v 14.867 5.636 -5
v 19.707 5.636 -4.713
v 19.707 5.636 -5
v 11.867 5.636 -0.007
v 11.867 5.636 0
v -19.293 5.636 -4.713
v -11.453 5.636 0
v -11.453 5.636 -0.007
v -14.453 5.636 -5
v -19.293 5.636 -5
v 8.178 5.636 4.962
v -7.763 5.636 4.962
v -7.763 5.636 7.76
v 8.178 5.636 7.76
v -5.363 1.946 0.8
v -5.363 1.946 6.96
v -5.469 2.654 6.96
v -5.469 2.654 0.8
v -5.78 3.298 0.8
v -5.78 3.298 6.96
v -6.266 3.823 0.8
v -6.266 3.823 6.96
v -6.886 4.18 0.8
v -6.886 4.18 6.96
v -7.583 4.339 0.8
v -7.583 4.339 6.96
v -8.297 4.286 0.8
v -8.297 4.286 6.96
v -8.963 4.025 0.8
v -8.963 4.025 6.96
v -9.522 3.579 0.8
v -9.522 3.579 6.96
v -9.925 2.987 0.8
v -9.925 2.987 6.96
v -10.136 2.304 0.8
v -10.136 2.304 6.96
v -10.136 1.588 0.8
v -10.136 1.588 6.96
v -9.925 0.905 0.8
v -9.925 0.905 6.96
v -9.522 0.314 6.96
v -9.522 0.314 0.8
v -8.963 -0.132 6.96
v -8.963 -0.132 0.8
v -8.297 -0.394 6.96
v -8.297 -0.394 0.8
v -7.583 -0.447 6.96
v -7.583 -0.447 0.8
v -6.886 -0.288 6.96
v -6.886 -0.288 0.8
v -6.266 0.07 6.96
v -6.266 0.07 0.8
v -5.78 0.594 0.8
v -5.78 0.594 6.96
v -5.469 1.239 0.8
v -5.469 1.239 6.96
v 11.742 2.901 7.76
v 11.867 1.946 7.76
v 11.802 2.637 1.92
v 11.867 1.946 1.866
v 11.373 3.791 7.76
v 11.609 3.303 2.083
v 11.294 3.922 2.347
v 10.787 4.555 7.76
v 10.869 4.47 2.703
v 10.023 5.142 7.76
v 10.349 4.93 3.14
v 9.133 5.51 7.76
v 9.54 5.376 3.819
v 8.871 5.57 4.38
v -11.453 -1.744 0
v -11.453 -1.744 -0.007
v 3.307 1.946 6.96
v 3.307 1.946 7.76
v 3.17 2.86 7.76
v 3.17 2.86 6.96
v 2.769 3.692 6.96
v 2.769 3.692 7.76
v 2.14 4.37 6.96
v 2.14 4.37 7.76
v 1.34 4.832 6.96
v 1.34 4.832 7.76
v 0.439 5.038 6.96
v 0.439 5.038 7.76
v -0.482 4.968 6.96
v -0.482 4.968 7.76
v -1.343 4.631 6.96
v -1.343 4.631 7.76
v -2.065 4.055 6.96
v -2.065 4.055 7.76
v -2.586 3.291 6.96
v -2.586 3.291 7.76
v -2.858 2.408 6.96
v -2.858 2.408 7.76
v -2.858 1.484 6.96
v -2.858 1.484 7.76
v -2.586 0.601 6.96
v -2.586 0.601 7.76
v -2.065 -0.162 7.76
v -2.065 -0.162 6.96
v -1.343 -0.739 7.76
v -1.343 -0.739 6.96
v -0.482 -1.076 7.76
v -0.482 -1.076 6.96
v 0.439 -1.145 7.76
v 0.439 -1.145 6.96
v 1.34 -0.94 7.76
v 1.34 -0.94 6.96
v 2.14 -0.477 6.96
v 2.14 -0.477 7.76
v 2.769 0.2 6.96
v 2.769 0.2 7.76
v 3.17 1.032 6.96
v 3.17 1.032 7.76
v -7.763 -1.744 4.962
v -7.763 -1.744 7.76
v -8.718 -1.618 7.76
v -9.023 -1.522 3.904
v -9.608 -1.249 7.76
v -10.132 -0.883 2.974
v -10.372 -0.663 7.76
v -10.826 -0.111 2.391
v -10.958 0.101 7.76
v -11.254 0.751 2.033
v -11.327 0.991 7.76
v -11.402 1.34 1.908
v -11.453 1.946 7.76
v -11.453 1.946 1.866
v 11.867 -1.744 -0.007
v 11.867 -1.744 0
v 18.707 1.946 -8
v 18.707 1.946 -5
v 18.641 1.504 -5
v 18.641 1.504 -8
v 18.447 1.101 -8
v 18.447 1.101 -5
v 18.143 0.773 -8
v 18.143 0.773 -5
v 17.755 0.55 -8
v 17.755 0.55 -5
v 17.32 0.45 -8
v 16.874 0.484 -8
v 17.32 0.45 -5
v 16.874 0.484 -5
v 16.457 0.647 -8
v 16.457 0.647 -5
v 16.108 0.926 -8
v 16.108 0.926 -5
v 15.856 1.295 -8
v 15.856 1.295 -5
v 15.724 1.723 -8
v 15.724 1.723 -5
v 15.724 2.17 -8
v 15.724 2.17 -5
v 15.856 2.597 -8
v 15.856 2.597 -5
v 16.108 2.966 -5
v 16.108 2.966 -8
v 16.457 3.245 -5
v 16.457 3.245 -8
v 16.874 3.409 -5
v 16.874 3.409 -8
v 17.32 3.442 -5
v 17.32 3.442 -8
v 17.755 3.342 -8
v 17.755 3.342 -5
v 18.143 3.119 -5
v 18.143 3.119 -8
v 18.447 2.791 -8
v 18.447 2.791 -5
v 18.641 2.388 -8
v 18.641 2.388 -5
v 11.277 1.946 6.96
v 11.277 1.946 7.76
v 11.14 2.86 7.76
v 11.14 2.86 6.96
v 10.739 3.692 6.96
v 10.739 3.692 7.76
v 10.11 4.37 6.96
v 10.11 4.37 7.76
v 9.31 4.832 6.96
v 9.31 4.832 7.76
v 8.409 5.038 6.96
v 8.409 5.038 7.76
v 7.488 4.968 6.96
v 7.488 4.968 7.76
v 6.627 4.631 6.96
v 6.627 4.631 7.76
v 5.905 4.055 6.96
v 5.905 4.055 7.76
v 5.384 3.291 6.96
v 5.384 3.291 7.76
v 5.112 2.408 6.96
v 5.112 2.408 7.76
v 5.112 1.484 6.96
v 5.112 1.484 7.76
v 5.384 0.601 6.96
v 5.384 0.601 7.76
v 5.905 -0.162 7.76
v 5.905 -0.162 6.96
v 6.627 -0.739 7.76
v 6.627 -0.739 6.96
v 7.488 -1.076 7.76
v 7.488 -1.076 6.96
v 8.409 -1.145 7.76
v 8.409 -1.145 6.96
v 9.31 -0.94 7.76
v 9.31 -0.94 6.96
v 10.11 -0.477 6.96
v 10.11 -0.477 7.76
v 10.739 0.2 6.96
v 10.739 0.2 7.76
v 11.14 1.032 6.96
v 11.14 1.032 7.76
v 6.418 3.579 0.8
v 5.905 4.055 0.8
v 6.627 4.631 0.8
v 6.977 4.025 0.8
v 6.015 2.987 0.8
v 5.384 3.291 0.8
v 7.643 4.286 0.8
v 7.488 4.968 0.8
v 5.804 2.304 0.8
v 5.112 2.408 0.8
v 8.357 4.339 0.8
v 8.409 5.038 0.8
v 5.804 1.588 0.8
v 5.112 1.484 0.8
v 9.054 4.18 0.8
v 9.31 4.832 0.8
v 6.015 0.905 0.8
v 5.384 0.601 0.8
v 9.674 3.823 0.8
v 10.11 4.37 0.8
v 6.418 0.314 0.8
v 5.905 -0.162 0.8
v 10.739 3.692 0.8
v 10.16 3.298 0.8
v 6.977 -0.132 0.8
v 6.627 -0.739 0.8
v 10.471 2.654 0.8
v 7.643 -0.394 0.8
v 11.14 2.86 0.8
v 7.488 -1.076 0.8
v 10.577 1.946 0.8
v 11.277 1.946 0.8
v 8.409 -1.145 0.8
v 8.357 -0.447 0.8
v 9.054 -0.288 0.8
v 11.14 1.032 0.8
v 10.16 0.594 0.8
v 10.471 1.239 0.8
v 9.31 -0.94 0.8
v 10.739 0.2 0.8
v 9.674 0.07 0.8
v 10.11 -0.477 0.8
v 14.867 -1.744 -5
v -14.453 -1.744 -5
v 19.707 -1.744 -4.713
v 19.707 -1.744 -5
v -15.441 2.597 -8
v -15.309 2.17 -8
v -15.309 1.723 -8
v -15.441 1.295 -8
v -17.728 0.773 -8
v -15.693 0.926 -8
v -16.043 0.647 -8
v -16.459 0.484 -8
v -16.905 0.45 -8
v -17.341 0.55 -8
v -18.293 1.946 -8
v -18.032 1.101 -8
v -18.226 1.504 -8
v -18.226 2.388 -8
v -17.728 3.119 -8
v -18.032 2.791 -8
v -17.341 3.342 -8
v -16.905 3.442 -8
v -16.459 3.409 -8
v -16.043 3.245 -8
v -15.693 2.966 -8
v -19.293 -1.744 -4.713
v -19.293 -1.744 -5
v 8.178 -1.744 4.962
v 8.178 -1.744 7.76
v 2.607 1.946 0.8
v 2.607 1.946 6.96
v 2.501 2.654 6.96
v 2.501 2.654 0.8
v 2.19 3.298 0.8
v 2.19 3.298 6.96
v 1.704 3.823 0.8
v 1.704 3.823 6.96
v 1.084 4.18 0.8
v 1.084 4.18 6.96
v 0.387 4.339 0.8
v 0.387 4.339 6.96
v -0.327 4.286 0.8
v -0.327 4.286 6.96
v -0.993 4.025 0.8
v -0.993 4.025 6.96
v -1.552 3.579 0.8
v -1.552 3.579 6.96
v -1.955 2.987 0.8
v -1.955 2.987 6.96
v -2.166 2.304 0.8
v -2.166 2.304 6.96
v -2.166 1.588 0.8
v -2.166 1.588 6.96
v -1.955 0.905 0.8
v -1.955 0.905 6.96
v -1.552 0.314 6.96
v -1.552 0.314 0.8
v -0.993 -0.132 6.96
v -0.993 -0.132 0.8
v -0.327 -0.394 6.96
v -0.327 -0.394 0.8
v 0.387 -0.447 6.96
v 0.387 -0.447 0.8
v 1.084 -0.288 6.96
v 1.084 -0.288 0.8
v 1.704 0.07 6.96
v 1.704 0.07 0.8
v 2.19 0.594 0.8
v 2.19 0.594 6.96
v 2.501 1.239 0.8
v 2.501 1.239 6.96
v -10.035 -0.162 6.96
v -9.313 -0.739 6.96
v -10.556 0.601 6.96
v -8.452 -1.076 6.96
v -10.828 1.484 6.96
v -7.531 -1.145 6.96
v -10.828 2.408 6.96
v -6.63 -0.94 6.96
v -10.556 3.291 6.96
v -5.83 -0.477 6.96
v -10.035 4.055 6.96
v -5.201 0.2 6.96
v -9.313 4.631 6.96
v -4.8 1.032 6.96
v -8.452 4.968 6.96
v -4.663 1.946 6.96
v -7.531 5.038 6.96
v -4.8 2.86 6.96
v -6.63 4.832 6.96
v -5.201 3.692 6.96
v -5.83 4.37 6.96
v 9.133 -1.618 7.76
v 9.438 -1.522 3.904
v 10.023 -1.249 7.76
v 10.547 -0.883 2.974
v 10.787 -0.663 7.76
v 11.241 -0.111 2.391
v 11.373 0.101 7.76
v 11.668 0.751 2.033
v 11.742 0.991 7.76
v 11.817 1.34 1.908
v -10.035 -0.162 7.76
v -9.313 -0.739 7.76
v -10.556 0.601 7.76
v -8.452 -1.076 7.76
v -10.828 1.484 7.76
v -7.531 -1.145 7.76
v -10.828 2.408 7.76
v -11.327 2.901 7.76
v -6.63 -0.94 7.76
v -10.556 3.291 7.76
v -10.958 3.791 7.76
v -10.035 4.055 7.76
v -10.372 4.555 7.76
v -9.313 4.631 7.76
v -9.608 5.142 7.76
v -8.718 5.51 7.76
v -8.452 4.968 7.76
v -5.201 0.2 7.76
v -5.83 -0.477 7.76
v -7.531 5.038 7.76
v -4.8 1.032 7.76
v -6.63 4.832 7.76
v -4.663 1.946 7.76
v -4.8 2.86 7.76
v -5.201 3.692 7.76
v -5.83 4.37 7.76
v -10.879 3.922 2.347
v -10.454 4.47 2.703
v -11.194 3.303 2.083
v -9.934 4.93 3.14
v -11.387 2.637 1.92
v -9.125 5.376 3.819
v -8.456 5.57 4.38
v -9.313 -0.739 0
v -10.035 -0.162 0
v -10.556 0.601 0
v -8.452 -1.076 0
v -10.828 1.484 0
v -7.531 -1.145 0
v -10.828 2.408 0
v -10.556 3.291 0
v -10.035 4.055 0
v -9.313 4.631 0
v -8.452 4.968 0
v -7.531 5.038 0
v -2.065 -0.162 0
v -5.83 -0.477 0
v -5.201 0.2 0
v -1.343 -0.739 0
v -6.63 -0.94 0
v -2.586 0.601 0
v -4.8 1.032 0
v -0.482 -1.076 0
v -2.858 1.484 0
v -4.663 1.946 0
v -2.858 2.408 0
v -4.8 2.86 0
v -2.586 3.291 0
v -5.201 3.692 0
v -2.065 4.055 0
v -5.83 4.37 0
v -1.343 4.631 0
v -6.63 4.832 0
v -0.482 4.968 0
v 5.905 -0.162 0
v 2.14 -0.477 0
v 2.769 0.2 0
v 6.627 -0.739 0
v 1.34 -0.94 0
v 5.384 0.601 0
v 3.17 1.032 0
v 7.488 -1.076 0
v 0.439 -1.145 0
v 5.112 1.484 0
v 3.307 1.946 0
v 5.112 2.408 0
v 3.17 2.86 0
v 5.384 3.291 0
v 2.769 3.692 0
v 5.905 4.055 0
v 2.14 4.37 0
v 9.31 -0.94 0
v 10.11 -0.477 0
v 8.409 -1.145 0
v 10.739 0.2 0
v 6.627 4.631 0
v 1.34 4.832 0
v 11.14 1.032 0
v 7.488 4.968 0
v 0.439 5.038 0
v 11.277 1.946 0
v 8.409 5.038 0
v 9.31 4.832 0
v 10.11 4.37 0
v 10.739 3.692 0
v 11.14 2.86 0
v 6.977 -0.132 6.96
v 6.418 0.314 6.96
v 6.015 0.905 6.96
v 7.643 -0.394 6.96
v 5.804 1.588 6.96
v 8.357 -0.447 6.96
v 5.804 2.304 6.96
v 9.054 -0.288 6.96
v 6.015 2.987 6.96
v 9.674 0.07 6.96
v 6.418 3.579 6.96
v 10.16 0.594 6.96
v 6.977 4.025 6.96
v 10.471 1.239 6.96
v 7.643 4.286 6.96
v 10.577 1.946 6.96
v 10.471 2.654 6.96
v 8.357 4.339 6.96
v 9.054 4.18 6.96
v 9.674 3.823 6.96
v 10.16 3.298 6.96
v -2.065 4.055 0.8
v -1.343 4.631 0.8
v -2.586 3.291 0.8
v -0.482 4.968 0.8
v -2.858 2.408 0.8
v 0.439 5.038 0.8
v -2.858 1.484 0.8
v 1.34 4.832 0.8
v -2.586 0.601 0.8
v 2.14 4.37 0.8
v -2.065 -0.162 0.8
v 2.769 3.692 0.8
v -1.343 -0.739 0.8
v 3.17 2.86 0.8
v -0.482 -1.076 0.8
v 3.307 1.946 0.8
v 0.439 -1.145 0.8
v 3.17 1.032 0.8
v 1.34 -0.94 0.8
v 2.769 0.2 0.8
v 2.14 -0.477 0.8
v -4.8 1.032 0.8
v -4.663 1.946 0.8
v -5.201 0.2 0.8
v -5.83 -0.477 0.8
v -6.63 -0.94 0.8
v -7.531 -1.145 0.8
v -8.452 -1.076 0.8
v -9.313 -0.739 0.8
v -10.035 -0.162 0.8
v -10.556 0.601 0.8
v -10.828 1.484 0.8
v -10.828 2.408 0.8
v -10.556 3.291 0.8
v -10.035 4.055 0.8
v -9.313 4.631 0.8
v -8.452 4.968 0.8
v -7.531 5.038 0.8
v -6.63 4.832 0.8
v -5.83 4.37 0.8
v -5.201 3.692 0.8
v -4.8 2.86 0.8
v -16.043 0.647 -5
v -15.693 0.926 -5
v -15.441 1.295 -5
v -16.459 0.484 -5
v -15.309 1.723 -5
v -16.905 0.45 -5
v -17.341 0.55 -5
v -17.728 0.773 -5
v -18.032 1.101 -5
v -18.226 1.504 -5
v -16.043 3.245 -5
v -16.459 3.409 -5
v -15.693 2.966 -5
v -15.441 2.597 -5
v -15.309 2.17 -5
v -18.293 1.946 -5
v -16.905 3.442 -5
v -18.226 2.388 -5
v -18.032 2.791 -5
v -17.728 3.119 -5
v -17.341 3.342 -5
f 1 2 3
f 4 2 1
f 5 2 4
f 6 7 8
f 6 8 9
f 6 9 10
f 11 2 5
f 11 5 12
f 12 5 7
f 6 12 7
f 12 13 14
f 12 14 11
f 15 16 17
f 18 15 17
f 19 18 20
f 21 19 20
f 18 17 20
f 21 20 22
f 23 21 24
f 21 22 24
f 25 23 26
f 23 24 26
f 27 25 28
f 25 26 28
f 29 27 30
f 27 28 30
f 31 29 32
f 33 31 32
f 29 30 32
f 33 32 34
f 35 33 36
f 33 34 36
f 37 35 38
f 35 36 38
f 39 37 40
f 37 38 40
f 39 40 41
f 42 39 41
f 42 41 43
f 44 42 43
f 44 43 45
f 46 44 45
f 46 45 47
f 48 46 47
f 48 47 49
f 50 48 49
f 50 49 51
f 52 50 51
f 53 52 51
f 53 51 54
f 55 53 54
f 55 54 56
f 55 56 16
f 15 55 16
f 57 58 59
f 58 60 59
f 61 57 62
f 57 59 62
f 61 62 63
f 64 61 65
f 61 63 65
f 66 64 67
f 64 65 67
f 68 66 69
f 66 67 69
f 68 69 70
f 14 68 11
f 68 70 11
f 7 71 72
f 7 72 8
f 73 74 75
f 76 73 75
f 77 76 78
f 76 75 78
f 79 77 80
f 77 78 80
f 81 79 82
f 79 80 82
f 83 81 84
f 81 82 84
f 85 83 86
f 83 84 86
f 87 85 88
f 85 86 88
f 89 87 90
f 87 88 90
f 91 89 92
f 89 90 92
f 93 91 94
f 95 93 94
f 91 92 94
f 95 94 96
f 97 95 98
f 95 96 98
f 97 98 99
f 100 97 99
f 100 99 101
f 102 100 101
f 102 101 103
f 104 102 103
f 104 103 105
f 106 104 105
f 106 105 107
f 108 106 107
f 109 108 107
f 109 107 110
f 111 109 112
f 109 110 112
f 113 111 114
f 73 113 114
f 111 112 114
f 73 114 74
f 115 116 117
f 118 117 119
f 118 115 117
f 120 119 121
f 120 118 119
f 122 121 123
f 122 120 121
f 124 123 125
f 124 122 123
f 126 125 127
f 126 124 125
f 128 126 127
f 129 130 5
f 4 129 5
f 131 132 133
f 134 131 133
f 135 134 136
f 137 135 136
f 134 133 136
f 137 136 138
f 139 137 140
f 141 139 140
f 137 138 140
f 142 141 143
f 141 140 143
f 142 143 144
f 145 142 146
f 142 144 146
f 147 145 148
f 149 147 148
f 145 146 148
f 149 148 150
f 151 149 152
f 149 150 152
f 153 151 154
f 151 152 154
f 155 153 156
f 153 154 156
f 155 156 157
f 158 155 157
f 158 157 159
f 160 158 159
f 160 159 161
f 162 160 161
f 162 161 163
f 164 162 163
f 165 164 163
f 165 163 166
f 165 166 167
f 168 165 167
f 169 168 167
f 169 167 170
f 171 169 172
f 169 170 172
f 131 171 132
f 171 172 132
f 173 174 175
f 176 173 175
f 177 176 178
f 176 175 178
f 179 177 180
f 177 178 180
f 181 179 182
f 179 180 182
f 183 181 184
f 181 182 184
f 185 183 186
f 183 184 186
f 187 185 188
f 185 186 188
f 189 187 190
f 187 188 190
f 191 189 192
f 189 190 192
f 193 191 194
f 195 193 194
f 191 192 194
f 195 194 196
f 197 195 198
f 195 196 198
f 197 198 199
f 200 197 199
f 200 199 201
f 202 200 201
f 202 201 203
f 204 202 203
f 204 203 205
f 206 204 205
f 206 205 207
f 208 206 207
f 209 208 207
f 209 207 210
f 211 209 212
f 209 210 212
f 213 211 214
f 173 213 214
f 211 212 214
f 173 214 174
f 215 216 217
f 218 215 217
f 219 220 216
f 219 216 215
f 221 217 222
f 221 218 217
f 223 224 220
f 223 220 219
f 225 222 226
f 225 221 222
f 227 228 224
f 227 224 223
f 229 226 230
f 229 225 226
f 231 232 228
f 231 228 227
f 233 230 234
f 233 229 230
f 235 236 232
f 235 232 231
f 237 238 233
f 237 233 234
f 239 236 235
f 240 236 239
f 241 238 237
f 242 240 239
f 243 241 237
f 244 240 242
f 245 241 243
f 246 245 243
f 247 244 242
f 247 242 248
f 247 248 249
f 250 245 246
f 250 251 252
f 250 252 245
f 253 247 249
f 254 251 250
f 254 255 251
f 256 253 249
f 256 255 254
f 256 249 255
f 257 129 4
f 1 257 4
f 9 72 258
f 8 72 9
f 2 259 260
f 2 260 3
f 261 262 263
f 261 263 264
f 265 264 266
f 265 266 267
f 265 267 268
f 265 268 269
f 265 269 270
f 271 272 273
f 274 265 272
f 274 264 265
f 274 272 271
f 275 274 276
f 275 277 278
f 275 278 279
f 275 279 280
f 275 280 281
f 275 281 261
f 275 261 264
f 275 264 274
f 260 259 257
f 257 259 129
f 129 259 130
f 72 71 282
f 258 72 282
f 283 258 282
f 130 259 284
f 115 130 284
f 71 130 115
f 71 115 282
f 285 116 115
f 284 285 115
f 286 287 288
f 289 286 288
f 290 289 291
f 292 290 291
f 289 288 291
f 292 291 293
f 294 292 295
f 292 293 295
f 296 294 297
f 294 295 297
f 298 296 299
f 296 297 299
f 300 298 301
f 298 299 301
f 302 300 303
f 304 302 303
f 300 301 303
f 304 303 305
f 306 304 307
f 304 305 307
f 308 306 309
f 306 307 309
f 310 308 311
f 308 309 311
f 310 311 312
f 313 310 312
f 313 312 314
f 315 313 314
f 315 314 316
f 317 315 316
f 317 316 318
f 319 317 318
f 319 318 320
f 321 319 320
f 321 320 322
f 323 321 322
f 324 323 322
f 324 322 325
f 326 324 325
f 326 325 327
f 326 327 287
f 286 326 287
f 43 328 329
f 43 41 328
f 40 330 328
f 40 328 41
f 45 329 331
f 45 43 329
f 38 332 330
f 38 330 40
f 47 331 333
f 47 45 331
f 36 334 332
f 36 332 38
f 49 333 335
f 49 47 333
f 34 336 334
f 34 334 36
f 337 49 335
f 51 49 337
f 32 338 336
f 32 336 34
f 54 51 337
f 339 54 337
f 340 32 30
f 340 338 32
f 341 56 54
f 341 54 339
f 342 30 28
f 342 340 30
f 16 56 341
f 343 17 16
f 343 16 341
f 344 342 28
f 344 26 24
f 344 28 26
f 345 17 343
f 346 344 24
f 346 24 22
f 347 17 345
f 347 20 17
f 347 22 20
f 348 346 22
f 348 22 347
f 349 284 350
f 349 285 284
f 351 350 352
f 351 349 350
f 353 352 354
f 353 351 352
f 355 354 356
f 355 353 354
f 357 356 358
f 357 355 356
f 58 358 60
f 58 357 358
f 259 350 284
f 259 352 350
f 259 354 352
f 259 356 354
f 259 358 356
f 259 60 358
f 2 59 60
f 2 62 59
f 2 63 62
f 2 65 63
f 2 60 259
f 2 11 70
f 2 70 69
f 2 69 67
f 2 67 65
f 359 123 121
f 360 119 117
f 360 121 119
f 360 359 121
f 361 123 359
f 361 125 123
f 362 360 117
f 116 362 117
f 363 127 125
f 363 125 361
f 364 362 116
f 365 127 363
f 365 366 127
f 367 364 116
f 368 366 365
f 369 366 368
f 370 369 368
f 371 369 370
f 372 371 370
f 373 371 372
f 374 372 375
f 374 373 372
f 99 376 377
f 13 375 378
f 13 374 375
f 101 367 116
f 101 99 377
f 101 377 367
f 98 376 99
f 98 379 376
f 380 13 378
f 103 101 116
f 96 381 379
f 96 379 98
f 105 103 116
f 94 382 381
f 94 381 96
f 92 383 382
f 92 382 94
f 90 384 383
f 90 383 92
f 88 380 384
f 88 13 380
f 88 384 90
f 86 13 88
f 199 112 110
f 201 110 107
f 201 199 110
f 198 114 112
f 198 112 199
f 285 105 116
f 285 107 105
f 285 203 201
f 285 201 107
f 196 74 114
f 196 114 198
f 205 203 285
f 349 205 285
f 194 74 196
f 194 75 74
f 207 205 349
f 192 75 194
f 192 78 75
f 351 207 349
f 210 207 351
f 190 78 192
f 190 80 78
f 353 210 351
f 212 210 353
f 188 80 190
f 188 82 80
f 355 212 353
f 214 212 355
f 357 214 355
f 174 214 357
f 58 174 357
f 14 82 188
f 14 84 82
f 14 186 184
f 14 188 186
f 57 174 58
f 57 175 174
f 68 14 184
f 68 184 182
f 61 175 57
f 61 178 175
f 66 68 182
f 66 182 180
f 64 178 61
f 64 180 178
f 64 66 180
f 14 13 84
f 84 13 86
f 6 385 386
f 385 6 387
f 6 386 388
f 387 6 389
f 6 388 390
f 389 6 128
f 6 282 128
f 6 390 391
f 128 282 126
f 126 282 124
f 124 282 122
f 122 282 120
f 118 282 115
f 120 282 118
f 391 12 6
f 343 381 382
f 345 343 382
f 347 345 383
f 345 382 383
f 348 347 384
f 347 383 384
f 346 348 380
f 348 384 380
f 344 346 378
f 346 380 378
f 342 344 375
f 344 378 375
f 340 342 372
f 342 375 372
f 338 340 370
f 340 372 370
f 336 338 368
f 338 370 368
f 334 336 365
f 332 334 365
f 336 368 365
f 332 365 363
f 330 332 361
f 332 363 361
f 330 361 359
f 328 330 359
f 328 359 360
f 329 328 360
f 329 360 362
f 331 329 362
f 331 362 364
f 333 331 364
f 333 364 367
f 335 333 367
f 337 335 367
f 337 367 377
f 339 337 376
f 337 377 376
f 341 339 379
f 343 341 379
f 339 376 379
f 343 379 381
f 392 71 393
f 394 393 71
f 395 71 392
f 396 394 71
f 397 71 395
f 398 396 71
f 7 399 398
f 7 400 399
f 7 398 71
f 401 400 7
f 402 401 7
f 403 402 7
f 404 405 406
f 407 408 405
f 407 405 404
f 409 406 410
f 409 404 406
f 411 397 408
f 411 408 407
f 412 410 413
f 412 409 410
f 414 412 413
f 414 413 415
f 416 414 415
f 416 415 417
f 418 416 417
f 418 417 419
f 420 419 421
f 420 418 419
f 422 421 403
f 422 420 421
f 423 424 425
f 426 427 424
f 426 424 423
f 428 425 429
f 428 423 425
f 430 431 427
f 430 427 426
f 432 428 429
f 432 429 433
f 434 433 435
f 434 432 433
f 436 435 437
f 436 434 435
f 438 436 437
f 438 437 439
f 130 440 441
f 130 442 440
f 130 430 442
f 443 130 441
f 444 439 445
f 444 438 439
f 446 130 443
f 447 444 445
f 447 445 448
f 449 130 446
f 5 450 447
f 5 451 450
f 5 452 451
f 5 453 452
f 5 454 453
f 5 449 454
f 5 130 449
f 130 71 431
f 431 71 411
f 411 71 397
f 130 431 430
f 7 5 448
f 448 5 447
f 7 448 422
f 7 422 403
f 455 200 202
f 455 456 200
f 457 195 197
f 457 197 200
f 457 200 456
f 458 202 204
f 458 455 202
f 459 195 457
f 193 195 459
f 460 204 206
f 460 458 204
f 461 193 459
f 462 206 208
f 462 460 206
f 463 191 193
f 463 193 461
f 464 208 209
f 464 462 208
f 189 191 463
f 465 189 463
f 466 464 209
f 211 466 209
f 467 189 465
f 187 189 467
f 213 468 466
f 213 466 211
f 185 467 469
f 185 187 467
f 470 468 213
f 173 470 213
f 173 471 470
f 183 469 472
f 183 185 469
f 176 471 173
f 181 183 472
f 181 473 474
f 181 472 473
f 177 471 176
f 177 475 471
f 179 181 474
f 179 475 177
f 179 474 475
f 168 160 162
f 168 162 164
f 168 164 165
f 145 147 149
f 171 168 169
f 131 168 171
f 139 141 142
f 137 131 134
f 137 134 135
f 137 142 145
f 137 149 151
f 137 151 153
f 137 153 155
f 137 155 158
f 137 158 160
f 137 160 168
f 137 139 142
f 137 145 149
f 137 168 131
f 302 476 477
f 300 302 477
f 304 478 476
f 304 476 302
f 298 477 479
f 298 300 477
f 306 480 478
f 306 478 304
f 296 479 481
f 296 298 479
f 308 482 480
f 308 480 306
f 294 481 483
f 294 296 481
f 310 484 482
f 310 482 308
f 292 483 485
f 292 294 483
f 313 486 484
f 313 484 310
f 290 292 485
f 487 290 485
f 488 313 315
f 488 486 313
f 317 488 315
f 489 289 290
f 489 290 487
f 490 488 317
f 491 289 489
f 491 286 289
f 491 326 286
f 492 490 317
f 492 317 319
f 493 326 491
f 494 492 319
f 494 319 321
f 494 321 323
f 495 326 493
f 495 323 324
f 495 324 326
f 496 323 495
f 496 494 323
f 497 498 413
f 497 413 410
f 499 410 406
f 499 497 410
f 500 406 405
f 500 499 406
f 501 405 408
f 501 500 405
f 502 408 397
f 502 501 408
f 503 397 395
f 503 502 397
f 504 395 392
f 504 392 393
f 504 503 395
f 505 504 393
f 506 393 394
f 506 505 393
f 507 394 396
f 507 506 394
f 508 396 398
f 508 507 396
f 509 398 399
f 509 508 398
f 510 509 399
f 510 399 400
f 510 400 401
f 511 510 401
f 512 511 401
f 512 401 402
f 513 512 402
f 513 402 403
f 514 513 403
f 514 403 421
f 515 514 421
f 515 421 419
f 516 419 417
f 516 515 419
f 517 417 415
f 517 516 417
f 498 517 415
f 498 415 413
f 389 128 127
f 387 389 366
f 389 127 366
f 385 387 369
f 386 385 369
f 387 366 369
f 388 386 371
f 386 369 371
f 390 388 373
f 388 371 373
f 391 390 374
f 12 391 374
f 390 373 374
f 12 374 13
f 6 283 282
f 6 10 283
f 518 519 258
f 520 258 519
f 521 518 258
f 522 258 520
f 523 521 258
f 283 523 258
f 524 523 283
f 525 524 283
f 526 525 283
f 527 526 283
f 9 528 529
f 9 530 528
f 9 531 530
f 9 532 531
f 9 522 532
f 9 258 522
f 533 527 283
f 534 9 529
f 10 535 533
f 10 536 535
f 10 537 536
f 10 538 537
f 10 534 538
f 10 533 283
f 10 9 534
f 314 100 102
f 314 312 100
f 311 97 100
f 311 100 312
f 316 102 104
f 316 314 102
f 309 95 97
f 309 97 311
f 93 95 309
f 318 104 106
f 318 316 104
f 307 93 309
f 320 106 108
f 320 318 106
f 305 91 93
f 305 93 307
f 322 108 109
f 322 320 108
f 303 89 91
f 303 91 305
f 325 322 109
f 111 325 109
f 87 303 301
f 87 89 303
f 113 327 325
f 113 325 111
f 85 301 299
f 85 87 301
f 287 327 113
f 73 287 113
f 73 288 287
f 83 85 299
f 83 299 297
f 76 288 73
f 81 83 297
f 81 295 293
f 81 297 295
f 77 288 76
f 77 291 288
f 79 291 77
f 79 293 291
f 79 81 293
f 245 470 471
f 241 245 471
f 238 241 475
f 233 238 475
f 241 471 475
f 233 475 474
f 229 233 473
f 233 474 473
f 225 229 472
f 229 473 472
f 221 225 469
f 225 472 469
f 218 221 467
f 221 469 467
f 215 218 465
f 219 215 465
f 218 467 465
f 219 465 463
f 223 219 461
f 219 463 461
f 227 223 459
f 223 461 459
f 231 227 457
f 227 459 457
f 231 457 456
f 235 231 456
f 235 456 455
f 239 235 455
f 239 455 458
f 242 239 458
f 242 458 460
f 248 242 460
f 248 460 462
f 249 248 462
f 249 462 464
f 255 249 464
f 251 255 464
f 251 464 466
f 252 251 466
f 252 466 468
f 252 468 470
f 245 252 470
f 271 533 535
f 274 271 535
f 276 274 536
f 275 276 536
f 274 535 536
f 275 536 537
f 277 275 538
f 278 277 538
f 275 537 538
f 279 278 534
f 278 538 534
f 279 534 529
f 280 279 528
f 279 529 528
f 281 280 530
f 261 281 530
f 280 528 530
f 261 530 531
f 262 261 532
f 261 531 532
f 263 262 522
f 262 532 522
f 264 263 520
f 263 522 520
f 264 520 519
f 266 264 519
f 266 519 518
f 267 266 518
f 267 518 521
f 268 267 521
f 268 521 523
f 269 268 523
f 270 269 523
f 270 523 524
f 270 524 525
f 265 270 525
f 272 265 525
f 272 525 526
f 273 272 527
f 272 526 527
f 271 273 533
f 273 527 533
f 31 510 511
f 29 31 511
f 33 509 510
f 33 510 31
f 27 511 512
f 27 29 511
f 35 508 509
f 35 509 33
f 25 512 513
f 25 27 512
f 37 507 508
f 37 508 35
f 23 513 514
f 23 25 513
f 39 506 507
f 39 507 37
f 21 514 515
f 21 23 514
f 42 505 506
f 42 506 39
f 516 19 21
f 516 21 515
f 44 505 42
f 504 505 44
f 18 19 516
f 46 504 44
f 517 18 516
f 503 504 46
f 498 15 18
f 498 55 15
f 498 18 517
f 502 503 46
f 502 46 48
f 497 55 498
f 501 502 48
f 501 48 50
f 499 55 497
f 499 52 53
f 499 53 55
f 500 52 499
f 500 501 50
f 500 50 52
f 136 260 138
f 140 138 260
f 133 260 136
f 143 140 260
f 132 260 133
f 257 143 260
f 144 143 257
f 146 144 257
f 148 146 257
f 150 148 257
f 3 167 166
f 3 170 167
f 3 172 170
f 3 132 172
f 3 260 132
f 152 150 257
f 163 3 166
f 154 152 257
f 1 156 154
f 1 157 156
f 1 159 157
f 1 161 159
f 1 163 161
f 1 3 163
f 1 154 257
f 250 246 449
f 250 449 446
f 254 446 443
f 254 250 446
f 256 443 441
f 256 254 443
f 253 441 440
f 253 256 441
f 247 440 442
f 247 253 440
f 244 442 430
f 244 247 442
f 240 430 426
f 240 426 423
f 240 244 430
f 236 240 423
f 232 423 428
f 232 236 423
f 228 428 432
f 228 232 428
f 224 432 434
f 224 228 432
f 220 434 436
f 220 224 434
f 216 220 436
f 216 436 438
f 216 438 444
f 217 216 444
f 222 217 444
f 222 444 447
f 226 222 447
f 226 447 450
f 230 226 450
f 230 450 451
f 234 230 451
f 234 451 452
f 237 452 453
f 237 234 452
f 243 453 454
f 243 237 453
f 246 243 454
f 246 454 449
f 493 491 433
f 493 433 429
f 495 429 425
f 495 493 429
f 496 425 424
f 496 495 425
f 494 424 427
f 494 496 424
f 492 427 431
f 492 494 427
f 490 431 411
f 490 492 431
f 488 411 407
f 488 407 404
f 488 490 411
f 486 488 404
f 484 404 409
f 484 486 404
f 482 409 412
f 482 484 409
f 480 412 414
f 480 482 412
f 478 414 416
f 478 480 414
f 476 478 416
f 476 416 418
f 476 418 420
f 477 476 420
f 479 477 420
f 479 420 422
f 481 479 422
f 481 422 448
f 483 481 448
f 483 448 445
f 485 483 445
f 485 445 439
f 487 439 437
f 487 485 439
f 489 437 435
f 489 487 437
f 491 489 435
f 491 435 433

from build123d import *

# Parameters (mm, degrees)
SKETCH1_W           = 23.32
SKETCH1_H           = 7.38
BOSS_EXTRUDE1_DEPTH = 7.76
SKETCH4_R           = 2.4
CUT_EXTRUDE1_DEPTH  = 7.76
SKETCH5_R           = 3.1
CUT_EXTRUDE2_DEPTH  = 0.8
CUT_EXTRUDE3_START  = -0.8
SKETCH6_R           = 3.1
CUT_EXTRUDE3_DEPTH  = 0.8
SKETCH7_W           = 2
SKETCH7_H           = 7.38
BOSS_EXTRUDE2_DEPTH = 7.84
SKETCH8_W           = 2
SKETCH8_H           = 7.38
BOSS_EXTRUDE3_DEPTH = 7.84
SKETCH9_W           = 7.84
SKETCH9_H           = 7.38
BOSS_EXTRUDE4_DEPTH = 5
SKETCH10_R          = 1.5
BOSS_EXTRUDE5_DEPTH = 3
CHAMFER1_SIZE       = 8
CHAMFER1_SIZE_2     = 6.712797049
CHAMFER2_SIZE       = 6.712797049
CHAMFER2_SIZE_2     = 8
CHAMFER3_SIZE       = 3
CHAMFER3_SIZE2      = 4.992838447
CHAMFER4_SIZE       = 3
CHAMFER4_SIZE2      = 4.992838447
FILLET1_R           = 3.69


# Some blends are built 0.0001 mm under size
with BuildPart() as part:
    # Sketch1 → Boss-Extrude1 (new body)
    with BuildSketch(Plane.XY):
        with Locations((0.207481698, 1.946178624)):
            Rectangle(SKETCH1_W, SKETCH1_H)
    extrude(amount=BOSS_EXTRUDE1_DEPTH)

    # Sketch4 → Cut-Extrude1 (cut)
    with BuildSketch(Plane.XY.offset(7.76)):
        with Locations((0.207481698, 1.946178624)):
            Circle(SKETCH4_R)
        with Locations((8.177481698, 1.946178624)):
            Circle(SKETCH4_R)
        with Locations((-7.762518302, 1.946178624)):
            Circle(SKETCH4_R)
    extrude(amount=-CUT_EXTRUDE1_DEPTH, mode=Mode.SUBTRACT)

    # Sketch5 → Cut-Extrude2 (cut)
    with BuildSketch(Plane.XY.offset(7.76)):
        with Locations((-7.762518302, 1.946178624)):
            Circle(SKETCH5_R)
        with Locations((0.207481698, 1.946178624)):
            Circle(SKETCH5_R)
        with Locations((8.177481698, 1.946178624)):
            Circle(SKETCH5_R)
    extrude(amount=-CUT_EXTRUDE2_DEPTH, mode=Mode.SUBTRACT)

    # Sketch6 → Cut-Extrude3 (cut)
    with BuildSketch(Plane(origin=(0, 0, 0), x_dir=(-1, 0, 0), z_dir=(0, 0, -1)).offset(CUT_EXTRUDE3_START)):
        with Locations(Location((-8.177481698, 1.946178624, 0), (0, 0, 180))):
            Circle(SKETCH6_R)
        with Locations(Location((-0.207481698, 1.946178624, 0), (0, 0, 180))):
            Circle(SKETCH6_R)
        with Locations(Location((7.762518302, 1.946178624, 0), (0, 0, 180))):
            Circle(SKETCH6_R)
    extrude(amount=CUT_EXTRUDE3_DEPTH, mode=Mode.SUBTRACT)

    # Sketch7 → Boss-Extrude2 (add)
    with BuildSketch(Plane(origin=(11.867481698, 0, 0), x_dir=(0, 0, -1), z_dir=(1, 0, 0))):
        with Locations((-1, 1.946178624)):
            Rectangle(SKETCH7_W, SKETCH7_H)
    extrude(amount=BOSS_EXTRUDE2_DEPTH)

    # Sketch8 → Boss-Extrude3 (add)
    with BuildSketch(Plane.ZY.offset(11.452518302)):
        with Locations((1, 1.946178624)):
            Rectangle(SKETCH8_W, SKETCH8_H)
    extrude(amount=BOSS_EXTRUDE3_DEPTH)

    # Sketch9 → Boss-Extrude4 (add)
    with BuildSketch(Plane(origin=(0, 0, 0), x_dir=(-1, 0, 0), z_dir=(0, 0, -1))):
        with Locations((-15.787481698, 1.946178624)):
            Rectangle(SKETCH9_W, SKETCH9_H)
        with Locations((15.372518302, 1.946178624)):
            Rectangle(SKETCH9_W, SKETCH9_H)
    extrude(amount=BOSS_EXTRUDE4_DEPTH)

    # Sketch10 → Boss-Extrude5 (add)
    with BuildSketch(Plane(origin=(0, 0, -5), x_dir=(-1, 0, 0), z_dir=(0, 0, -1))):
        with Locations((16.792518302, 1.946178624)):
            Circle(SKETCH10_R)
        with Locations(Location((-17.207481698, 1.946178624, 0), (0, 0, 180))):
            Circle(SKETCH10_R)
    extrude(amount=BOSS_EXTRUDE5_DEPTH)

    # Chamfer1
    # the kernel refuses this chamfer: 8, 6.712797049 mm, written as the material it takes off along each edge
    with BuildSketch(Plane(origin=(19.707481698, 26.25542745, 2), x_dir=(-0.9996889667359941, 0, 0.024939322090234348), z_dir=(0, -1, 0))) as chamfer1_piece_1_section:
        Polygon((CHAMFER1_SIZE * 0.999688966736, CHAMFER1_SIZE * 0.0249393220902), (-CHAMFER1_SIZE_2 * 0.0249393220918, CHAMFER1_SIZE_2 * 0.999688966798), (0, 0), align=None)
    chamfer1_piece_1 = extrude(amount=48.618497654, mode=Mode.PRIVATE)
    chamfer1_piece_1 = split(chamfer1_piece_1, bisect_by=Plane(origin=(11.867481698, 1.946178624, -0.208519476), z_dir=(1, 0, 0)), keep=Keep.TOP, mode=Mode.PRIVATE)
    add(chamfer1_piece_1, mode=Mode.SUBTRACT)

    # Chamfer2
    # the kernel refuses this chamfer: 8, 6.712797049 mm, written as the material it takes off along each edge
    with BuildSketch(Plane(origin=(-19.292518302, -22.363070203, 2), x_dir=(-0.035409536913662526, 0, -0.9993728857116146), z_dir=(0, 1, 0))) as chamfer2_piece_1_section:
        Polygon((CHAMFER2_SIZE * 0.999372885774, -CHAMFER2_SIZE * 0.0354095369159), (-CHAMFER2_SIZE_2 * 0.0354095369137, -CHAMFER2_SIZE_2 * 0.999372885712), (0, 0), align=None)
    chamfer2_piece_1 = extrude(amount=48.618497654, mode=Mode.PRIVATE)
    chamfer2_piece_1 = split(chamfer2_piece_1, bisect_by=Plane(origin=(-11.452518302, 1.946178624, -0.208519476), z_dir=(-1, 0, 0)), keep=Keep.TOP, mode=Mode.PRIVATE)
    add(chamfer2_piece_1, mode=Mode.SUBTRACT)

    # Chamfer3
    chamfer3_edges = [part.edges().sort_by_distance(p)[0] for p in [
        (11.867481698, 1.946178624, -5),
    ]]
    chamfer3_side = [part.faces().sort_by_distance(p)[0] for p in [
        (15.589858806, 1.946178624, -5),
    ]]
    chamfer(chamfer3_edges, length=CHAMFER3_SIZE, length2=CHAMFER3_SIZE2, reference=chamfer3_side[0])

    # Chamfer4
    chamfer4_edges = [part.edges().sort_by_distance(p)[0] for p in [
        (-11.452518302, 1.946178624, -5),
    ]]
    chamfer4_side = [part.faces().sort_by_distance(p)[0] for p in [
        (-15.17489541, 1.946178624, -5),
    ]]
    chamfer(chamfer4_edges, length=CHAMFER4_SIZE, length2=CHAMFER4_SIZE2, reference=chamfer4_side[0])

    # Fillet1
    fillet1_edges = [part.edges().sort_by_distance(p)[0] for p in [
        (11.867481698, -1.743821376, 4.81287203),
        (11.867481698, 5.636178624, 4.81287203),
        (-11.452518302, 5.636178624, 4.81287203),
        (-11.452518302, -1.743821376, 4.81287203),
    ]]
    fillet(fillet1_edges, radius=FILLET1_R - 0.0001)  # a hair under: the kernel refuses the full size


solid = part.part
